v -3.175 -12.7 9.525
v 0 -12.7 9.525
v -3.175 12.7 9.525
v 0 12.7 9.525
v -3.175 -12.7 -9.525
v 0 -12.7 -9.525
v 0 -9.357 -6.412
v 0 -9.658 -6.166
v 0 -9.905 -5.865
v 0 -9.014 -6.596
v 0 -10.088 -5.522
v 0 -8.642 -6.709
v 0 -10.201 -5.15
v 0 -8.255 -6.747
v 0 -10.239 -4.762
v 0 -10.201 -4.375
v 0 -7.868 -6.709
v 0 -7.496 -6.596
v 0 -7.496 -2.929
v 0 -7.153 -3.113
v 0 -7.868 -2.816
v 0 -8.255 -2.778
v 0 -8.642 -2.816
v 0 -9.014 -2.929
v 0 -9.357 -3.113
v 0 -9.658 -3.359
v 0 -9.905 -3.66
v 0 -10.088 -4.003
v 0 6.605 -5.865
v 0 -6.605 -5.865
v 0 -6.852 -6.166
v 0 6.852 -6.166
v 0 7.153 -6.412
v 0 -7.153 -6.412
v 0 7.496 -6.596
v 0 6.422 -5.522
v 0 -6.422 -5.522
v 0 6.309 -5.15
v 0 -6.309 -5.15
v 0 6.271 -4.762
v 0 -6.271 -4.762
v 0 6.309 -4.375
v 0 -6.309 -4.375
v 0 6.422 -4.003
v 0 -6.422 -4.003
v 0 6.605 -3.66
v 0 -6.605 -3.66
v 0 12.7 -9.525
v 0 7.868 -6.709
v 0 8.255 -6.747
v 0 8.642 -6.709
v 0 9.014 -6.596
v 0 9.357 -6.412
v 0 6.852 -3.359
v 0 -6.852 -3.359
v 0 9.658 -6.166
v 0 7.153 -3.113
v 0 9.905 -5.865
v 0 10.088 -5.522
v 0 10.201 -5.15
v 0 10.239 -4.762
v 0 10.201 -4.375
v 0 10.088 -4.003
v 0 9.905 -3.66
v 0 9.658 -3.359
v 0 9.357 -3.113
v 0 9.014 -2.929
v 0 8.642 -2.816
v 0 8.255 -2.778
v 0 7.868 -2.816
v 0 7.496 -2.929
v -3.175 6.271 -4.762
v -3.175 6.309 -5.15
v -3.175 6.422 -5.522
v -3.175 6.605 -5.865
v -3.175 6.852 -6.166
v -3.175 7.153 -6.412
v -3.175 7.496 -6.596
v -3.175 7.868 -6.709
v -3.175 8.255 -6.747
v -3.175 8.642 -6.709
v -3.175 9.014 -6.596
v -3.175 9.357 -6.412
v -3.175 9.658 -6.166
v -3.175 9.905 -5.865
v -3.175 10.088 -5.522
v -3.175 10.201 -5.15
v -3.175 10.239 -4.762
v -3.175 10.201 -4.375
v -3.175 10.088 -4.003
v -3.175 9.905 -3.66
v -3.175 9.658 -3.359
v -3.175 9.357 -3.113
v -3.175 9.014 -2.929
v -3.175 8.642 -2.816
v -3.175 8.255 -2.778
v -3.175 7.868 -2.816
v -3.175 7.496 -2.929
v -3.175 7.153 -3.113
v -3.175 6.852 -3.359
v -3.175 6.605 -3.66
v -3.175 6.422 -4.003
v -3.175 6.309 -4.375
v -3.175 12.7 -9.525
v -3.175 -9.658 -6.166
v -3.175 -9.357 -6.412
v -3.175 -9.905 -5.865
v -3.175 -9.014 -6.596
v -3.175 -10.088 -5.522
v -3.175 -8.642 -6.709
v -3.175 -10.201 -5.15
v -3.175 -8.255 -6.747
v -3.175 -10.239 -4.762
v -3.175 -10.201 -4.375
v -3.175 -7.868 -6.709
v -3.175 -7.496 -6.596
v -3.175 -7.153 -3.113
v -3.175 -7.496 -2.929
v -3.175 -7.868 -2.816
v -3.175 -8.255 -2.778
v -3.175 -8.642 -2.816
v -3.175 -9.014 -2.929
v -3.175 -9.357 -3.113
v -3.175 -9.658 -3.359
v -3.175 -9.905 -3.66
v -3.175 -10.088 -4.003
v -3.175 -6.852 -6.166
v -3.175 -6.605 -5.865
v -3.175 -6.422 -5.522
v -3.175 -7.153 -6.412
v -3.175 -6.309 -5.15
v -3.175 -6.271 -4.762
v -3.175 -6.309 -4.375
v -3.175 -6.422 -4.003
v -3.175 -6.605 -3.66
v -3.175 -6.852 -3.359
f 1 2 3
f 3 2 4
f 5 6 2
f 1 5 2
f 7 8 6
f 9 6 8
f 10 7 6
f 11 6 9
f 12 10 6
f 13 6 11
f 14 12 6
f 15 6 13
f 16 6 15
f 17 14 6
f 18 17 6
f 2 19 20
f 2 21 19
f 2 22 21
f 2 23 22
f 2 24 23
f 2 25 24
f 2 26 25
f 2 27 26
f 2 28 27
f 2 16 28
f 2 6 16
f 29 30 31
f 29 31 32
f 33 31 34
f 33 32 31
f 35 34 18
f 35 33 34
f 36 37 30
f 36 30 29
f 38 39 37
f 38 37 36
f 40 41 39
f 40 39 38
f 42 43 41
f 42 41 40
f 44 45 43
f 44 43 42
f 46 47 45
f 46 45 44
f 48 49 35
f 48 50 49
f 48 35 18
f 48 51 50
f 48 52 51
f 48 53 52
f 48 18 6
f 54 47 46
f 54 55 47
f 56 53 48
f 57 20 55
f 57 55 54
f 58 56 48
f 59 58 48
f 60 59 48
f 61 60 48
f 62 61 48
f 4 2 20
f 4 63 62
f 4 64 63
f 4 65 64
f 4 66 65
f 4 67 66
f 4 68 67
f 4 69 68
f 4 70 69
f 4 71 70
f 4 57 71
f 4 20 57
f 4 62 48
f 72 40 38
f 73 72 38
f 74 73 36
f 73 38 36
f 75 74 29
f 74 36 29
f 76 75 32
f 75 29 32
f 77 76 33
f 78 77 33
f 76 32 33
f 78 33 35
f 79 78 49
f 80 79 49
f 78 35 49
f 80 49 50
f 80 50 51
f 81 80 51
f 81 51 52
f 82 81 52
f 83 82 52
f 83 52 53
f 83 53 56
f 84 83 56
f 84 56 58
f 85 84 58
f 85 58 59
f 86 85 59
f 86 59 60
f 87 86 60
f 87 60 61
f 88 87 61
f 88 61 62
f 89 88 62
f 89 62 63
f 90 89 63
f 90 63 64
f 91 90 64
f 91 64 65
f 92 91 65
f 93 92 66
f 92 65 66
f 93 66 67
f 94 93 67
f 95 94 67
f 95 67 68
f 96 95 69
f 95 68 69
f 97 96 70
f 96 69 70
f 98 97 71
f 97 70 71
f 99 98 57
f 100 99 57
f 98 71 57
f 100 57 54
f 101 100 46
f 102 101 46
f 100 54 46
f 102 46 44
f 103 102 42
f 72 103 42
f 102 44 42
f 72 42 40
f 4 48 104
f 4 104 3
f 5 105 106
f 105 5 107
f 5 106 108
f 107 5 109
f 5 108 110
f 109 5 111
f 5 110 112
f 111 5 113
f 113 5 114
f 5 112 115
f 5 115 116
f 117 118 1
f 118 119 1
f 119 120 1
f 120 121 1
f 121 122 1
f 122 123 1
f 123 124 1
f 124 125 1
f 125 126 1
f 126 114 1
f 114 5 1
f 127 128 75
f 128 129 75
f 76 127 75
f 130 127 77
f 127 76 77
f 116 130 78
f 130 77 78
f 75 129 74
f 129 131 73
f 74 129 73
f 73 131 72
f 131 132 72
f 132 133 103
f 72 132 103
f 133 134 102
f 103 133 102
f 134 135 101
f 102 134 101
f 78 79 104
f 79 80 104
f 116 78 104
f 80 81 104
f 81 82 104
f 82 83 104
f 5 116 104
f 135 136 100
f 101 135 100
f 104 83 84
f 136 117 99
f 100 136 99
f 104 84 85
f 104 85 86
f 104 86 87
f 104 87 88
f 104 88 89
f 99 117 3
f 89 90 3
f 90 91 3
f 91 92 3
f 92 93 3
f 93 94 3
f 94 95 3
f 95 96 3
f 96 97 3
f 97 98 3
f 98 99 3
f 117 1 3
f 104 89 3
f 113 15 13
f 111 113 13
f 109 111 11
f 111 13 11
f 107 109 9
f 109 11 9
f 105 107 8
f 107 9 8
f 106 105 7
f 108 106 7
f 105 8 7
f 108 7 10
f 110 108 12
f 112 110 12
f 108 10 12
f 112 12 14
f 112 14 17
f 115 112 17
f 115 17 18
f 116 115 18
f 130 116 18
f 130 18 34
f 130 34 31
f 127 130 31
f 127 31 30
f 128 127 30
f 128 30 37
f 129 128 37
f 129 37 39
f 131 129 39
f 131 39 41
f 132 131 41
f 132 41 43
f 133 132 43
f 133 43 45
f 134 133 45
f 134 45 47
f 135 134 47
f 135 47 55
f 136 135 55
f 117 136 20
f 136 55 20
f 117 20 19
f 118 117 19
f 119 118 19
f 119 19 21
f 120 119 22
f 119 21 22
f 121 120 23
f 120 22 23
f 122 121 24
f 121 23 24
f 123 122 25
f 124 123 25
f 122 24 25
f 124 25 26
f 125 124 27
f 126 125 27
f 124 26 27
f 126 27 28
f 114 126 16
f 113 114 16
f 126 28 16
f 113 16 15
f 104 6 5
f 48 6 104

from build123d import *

# Parameters (mm, degrees)
F0_W     = 25.4
F0_H     = 19.05
F1_DEPTH = 3.175
F3_DEPTH = 3.176


with BuildPart() as f1:
    # F0 (on Right) → F1 (new body)
    with BuildSketch(Plane.YZ):
        Rectangle(F0_W, F0_H)
    extrude(amount=-F1_DEPTH)

    # F2 (on face) → F3 (cut, through all)
    with BuildSketch(Plane.YZ):
        with BuildLine():
            ThreePointArc((-6.270625, -4.7625), (-8.255, -2.778125), (-10.239375, -4.7625))
            Line((-10.239375, -4.7625), (-6.270625, -4.7625))
        make_face()
        with BuildLine():
            ThreePointArc((10.239375, -4.7625), (8.255, -2.778125), (6.270625, -4.7625))
            Line((6.270625, -4.7625), (10.239375, -4.7625))
        make_face()
        with BuildLine():
            Line((10.239375, -4.7625), (6.270625, -4.7625))
            ThreePointArc((6.270625, -4.7625), (8.255, -6.746875), (10.239375, -4.7625))
        make_face()
        with BuildLine():
            Line((-6.270625, -4.7625), (-10.239375, -4.7625))
            ThreePointArc((-10.239375, -4.7625), (-8.255, -6.746875), (-6.270625, -4.7625))
        make_face()
    extrude(amount=-F3_DEPTH, mode=Mode.SUBTRACT)


solid = f1.part
